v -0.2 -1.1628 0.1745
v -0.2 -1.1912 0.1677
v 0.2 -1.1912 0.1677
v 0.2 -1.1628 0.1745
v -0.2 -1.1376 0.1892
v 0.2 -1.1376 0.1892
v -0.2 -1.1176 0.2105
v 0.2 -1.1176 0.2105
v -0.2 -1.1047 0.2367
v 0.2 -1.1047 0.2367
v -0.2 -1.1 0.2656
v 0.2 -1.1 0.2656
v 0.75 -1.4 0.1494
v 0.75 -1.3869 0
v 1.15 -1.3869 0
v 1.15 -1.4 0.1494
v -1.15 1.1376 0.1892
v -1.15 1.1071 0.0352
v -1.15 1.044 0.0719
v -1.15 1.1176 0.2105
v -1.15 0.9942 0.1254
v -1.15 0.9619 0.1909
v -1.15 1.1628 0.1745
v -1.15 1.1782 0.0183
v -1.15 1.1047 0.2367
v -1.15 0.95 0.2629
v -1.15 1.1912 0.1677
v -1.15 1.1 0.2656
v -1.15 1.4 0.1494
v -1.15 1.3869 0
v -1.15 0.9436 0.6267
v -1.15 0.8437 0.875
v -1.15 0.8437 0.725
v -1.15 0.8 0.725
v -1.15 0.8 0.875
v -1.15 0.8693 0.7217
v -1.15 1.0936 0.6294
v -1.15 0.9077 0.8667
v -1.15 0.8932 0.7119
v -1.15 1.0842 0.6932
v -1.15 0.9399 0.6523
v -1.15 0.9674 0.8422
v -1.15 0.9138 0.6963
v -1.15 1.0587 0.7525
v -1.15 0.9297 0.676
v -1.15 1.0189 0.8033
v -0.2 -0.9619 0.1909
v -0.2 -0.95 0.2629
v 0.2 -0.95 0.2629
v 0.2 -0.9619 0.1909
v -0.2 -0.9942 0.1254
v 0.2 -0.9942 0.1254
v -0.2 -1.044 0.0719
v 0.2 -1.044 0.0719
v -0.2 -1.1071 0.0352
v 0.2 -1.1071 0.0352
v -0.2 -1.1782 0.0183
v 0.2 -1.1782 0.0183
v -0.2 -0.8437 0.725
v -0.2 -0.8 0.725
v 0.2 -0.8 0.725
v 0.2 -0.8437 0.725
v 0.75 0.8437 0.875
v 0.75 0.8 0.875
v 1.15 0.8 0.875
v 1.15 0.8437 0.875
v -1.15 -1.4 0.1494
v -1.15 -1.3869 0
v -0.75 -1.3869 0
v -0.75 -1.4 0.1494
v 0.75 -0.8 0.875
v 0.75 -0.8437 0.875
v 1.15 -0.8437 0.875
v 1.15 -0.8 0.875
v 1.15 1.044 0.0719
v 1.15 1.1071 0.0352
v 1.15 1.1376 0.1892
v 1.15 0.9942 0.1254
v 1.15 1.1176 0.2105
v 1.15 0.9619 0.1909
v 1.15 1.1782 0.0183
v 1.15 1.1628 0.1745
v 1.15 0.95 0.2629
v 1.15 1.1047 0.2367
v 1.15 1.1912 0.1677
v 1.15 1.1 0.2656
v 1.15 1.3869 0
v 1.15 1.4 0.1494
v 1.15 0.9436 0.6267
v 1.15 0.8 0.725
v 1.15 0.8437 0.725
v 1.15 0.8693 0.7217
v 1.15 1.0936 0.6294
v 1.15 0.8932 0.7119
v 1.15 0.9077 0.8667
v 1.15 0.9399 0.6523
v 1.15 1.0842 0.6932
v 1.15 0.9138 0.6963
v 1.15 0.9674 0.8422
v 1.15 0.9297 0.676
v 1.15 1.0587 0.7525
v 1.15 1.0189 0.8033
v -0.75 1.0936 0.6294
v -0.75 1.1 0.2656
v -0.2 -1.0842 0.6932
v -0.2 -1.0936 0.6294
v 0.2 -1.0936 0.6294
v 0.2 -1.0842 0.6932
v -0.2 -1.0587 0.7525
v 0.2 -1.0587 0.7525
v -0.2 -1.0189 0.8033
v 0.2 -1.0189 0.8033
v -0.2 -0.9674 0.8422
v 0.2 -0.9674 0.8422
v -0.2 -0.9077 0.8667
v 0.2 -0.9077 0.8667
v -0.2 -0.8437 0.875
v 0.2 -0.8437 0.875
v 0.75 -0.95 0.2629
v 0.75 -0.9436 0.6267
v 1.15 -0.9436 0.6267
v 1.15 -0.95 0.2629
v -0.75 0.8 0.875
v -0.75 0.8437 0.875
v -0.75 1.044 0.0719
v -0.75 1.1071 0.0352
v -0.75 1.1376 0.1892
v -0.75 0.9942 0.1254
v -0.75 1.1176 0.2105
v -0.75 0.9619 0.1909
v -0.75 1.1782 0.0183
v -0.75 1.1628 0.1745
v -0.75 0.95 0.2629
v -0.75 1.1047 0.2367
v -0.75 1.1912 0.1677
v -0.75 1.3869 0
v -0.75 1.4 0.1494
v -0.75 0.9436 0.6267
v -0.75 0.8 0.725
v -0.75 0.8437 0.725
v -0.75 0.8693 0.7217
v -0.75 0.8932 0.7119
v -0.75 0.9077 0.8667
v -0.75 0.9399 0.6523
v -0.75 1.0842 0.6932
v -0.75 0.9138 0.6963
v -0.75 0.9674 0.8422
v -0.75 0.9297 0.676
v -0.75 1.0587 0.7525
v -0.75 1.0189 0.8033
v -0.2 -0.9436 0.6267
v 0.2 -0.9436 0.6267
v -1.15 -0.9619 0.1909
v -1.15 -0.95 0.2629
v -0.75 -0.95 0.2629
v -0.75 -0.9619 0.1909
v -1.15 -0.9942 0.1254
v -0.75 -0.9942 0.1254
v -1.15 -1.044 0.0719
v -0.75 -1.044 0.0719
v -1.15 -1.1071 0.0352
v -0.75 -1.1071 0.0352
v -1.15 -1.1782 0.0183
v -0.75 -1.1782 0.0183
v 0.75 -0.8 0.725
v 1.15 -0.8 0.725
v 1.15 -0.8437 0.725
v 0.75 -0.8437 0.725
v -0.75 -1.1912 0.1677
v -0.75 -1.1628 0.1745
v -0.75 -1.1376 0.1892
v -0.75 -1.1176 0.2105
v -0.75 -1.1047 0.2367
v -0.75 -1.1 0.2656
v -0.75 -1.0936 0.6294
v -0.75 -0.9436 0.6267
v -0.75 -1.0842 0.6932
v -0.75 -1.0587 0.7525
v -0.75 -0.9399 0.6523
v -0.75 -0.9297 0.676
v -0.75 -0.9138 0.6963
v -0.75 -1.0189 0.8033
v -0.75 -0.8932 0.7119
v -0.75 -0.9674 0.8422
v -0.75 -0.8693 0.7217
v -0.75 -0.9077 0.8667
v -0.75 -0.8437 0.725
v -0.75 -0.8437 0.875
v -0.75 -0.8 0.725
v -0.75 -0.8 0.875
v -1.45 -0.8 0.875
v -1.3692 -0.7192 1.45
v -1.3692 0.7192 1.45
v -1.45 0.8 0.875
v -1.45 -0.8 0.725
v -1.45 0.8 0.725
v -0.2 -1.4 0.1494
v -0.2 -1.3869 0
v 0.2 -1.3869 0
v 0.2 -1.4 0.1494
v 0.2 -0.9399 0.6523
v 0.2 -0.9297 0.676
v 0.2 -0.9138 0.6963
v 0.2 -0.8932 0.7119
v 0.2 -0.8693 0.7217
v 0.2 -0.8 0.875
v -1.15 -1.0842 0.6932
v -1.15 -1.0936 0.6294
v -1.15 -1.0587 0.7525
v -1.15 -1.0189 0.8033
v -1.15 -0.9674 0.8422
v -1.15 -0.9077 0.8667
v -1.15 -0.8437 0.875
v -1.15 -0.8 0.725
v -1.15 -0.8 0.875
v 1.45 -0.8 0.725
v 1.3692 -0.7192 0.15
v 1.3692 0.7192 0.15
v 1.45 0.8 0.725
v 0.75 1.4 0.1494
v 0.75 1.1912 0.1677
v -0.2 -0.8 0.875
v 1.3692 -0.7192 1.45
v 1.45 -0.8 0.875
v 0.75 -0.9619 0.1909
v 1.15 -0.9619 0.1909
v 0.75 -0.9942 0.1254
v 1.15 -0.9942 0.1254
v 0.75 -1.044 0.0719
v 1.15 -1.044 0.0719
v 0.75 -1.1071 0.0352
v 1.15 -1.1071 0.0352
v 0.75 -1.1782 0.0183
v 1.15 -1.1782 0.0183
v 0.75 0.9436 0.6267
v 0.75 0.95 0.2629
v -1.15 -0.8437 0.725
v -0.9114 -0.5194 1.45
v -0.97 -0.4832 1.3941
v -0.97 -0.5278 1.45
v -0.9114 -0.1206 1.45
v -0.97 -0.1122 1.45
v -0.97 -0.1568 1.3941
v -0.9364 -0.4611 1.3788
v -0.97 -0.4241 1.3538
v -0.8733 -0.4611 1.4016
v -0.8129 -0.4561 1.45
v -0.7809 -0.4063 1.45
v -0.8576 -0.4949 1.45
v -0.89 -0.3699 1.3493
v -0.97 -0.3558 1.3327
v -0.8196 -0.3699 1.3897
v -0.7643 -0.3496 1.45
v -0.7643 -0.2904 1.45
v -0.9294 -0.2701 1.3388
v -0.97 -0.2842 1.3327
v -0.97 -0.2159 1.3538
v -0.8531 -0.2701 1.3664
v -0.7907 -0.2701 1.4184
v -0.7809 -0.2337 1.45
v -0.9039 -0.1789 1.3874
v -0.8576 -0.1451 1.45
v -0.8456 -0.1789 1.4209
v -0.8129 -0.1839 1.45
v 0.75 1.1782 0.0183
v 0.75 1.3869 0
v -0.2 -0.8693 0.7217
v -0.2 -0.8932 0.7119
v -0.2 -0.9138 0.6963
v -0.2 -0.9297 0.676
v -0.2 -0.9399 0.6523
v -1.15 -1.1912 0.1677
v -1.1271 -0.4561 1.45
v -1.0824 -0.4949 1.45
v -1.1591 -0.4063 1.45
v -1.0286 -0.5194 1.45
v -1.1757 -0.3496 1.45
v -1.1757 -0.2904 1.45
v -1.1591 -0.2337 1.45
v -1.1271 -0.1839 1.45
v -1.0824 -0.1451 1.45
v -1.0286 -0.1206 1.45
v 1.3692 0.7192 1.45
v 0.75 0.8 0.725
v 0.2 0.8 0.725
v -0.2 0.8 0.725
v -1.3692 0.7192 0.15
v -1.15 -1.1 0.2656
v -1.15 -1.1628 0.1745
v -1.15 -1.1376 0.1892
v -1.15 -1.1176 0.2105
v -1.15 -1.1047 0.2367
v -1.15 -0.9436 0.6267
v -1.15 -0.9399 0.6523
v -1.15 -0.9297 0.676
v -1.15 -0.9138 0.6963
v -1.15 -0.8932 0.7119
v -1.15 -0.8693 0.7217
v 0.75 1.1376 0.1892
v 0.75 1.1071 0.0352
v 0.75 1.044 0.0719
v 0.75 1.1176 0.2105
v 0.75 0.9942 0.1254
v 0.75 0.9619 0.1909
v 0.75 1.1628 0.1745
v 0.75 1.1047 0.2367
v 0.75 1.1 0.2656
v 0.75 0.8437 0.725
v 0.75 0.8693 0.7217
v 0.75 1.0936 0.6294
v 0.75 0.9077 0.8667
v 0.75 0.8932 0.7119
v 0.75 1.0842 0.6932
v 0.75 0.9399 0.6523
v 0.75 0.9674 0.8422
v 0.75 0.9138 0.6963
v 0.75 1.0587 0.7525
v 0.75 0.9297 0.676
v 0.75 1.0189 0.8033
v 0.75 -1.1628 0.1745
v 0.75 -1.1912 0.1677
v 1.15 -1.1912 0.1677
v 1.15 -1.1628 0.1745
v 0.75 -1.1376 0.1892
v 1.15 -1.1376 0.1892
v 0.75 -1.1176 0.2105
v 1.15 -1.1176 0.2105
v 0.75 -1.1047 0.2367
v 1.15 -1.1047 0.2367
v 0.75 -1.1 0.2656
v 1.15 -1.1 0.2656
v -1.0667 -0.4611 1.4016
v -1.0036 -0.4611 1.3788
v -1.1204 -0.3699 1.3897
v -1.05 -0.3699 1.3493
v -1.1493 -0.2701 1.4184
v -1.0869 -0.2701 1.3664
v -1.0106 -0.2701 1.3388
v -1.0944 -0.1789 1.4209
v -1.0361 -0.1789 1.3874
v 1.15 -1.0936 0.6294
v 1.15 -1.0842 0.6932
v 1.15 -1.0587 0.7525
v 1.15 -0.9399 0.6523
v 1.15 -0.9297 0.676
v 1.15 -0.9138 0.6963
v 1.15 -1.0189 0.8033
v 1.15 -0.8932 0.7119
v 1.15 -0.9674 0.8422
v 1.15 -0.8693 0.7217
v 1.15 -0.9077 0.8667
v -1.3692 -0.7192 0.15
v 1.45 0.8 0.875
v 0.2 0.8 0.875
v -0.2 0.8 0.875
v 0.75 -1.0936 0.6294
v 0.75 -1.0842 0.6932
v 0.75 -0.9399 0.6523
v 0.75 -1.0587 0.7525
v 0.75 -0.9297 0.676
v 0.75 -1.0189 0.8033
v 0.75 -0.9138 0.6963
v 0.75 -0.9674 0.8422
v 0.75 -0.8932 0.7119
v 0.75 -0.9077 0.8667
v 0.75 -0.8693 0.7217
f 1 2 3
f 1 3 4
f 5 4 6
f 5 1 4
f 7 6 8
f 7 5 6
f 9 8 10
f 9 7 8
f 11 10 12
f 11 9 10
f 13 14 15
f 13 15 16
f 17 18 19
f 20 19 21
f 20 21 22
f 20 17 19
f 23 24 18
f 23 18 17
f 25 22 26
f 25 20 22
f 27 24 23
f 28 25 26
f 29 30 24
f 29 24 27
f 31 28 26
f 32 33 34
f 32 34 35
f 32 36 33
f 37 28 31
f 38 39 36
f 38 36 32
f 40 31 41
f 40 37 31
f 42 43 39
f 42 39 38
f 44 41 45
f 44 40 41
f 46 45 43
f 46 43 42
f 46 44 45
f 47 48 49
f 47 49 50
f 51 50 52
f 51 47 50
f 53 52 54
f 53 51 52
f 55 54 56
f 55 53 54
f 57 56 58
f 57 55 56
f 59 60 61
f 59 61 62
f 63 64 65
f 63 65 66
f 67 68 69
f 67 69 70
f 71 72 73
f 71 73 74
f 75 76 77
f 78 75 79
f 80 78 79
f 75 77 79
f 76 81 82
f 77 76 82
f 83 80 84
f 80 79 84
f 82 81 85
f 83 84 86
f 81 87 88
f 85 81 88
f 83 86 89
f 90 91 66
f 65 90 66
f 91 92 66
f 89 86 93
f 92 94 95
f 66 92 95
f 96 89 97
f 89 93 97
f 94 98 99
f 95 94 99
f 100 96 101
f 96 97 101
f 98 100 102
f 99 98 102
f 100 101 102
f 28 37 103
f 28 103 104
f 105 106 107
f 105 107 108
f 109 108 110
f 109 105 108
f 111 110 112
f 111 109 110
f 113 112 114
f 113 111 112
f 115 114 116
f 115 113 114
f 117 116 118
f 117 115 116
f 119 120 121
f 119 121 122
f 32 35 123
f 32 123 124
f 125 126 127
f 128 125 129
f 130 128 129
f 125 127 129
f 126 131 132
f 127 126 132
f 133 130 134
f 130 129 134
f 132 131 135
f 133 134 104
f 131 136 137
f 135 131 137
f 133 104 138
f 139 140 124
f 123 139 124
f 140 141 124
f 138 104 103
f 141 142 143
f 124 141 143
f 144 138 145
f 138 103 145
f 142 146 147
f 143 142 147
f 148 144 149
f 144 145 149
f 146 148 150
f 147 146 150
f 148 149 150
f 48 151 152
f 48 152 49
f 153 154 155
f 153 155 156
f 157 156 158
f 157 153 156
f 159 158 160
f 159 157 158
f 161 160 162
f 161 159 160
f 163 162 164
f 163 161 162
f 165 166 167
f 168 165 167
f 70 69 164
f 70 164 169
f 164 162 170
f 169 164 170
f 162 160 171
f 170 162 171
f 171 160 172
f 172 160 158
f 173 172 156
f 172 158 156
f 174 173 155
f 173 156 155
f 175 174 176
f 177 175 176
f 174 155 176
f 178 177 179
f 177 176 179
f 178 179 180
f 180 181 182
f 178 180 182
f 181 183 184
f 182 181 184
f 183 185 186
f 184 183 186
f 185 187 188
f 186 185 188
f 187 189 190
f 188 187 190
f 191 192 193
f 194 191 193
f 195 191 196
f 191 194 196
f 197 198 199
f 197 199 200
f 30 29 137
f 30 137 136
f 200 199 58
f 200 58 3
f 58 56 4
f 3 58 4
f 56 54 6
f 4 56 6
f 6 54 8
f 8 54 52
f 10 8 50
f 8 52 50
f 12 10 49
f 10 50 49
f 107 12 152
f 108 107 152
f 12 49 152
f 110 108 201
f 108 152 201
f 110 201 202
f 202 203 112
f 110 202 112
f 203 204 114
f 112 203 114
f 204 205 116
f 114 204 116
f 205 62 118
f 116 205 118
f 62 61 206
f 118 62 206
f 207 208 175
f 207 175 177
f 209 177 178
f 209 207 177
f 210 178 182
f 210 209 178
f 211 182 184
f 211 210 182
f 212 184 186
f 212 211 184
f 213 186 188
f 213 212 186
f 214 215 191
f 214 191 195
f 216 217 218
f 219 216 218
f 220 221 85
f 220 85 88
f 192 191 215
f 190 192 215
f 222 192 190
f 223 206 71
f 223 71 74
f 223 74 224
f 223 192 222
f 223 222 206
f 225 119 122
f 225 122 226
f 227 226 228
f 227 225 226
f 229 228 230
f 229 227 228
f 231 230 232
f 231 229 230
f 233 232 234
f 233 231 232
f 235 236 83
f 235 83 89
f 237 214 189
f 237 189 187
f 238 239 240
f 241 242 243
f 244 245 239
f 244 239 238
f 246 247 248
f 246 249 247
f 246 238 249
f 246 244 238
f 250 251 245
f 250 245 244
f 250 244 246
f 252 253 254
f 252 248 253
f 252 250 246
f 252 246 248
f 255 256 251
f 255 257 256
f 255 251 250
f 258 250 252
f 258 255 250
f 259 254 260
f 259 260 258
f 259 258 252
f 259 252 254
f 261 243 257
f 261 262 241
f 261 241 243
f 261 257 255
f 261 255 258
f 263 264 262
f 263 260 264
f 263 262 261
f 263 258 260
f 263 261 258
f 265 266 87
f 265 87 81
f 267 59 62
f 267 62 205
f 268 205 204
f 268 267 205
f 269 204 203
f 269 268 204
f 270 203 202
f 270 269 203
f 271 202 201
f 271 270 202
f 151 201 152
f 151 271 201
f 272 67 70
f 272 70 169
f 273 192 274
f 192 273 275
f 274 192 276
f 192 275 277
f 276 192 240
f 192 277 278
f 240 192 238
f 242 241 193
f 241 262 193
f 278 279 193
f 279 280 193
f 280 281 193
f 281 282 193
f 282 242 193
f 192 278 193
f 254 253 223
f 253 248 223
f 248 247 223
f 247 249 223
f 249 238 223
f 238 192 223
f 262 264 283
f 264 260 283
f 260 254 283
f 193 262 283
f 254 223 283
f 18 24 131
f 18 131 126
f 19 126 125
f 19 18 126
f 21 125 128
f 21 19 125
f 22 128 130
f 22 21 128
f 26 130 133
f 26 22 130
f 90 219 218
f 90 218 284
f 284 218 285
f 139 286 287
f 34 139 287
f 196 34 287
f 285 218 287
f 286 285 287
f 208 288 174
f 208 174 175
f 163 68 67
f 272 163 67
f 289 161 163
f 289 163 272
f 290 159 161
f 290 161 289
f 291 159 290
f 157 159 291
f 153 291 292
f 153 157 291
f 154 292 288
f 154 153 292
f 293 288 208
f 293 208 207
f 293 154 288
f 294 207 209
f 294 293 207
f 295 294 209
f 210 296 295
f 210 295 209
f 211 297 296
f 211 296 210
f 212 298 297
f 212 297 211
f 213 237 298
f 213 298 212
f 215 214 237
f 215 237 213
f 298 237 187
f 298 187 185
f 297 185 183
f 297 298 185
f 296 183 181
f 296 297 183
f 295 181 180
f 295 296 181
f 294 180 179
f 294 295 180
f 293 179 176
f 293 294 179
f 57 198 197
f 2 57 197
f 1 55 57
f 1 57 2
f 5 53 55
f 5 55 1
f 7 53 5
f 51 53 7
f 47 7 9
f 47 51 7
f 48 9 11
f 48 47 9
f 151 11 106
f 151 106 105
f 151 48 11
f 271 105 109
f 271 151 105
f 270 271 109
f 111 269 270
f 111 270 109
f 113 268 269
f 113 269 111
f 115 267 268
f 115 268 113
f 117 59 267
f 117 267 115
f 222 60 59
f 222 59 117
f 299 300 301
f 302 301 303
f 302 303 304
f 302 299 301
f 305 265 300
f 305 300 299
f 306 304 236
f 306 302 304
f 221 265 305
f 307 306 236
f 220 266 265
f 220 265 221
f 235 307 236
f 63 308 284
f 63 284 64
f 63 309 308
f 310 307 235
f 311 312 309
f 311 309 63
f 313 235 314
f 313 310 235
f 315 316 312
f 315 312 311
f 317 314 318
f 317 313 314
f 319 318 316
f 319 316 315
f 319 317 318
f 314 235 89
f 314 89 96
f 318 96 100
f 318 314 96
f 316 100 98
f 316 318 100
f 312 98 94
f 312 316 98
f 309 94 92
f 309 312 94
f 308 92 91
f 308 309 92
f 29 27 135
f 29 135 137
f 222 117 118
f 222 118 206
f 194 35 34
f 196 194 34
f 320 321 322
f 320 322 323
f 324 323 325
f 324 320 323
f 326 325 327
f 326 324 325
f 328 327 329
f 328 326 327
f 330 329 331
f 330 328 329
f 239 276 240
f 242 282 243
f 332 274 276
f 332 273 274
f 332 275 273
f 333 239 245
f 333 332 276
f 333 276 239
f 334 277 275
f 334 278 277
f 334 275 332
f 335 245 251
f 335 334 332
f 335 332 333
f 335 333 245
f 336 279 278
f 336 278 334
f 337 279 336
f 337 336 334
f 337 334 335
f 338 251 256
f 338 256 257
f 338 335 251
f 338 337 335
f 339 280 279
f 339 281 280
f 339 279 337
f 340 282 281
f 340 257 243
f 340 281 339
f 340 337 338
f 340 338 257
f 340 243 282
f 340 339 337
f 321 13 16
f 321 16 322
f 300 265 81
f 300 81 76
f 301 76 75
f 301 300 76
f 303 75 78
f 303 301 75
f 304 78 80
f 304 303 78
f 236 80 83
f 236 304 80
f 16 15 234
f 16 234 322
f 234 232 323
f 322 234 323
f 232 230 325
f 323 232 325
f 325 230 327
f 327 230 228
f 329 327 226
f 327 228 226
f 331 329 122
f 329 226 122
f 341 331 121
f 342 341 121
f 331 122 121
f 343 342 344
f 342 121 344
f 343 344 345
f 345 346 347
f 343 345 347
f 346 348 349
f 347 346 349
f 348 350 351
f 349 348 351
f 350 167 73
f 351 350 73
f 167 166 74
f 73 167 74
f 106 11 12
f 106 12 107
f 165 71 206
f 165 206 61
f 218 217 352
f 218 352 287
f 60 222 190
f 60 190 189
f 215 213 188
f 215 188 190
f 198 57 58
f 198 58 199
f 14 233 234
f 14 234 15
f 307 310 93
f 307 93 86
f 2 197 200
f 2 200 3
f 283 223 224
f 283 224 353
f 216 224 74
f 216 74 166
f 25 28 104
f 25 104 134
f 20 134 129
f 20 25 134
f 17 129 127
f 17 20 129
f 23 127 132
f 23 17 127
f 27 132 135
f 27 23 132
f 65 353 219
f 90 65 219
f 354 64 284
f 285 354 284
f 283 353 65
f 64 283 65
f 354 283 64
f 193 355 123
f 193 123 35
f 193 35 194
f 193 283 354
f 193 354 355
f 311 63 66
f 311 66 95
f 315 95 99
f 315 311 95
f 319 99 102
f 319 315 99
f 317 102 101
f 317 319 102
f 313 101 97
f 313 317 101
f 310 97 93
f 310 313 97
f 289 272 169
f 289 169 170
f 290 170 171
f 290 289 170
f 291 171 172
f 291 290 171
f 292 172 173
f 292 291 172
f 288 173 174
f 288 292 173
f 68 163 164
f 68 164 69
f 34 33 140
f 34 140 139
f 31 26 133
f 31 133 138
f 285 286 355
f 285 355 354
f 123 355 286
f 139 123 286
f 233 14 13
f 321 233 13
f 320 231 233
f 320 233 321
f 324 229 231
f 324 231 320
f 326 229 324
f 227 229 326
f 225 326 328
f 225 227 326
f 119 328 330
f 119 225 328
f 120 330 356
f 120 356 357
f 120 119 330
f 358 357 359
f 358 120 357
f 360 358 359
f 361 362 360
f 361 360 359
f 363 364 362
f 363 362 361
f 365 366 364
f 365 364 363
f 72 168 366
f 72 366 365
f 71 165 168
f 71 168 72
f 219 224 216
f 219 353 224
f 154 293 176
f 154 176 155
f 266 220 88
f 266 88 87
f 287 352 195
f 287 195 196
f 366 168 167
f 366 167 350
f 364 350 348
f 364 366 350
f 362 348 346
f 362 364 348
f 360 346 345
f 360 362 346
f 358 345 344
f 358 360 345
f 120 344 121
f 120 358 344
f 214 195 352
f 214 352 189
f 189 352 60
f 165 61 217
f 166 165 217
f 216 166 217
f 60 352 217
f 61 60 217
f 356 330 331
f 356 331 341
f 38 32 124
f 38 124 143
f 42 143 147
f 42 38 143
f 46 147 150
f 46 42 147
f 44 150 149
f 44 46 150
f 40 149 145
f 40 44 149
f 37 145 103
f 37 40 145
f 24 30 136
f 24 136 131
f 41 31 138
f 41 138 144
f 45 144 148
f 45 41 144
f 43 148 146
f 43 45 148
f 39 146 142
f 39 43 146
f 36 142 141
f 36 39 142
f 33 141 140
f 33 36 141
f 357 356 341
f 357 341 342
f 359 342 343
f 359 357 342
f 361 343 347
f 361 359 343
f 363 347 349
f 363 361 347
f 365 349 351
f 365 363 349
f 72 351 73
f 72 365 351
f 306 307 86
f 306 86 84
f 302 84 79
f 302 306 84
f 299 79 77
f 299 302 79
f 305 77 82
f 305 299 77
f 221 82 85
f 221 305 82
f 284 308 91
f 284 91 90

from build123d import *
from OCP.BRepFilletAPI import BRepFilletAPI_MakeChamfer
from build123d.topology import SkipClean

# Parameters (mm, degrees)
BODYWXH_W             = 1.3
BODYWXH_H             = 1.6
BOSS_BODY_DEPTH       = 1.45
CHAMFER1_SIZE         = 0.575
CHAMFER1_SIZE2        = 0.08081098
PINS_DEPTH            = 0.4
PATTERNLEADS_COUNT    = 3
PATTERNLEADS_PITCH    = 0.95
DELETEFACE1_START     = 0.8
DELETEFACE1_OUTLINE_W = 0.4
DELETEFACE1_OUTLINE_H = 1.875
DELETEFACE1_DEPTH     = 0.6


# Read off the part's stored shape, not the designer's step: DeleteFace1
with BuildPart() as part:
    # BodyWxH → Boss-Body (new, symmetric)
    with BuildSketch(Plane(origin=(0, 0, 0), x_dir=(0, 0, -1), z_dir=(1, 0, 0))):
        with Locations((-0.8, 0)):
            Rectangle(BODYWXH_W, BODYWXH_H)
    extrude(amount=BOSS_BODY_DEPTH, both=True)

    # Chamfer1: one chamfer whose edges measure the first distance from different faces: ONE call of the kernel's chamfer builder (chamfer() names one face for all edges)
    chamfer1_edges_1 = [part.edges().sort_by_distance(p)[0] for p in [
        (1.45, 0, 0.15),
        (1.45, 0, 1.45),
    ]]
    chamfer1_side_1 = [part.faces().sort_by_distance(p)[0] for p in [
        (1.45, 0, 0.8),
    ]]
    chamfer1_edges_2 = [part.edges().sort_by_distance(p)[0] for p in [
        (-1.45, 0, 0.15),
        (-1.45, 0, 1.45),
    ]]
    chamfer1_side_2 = [part.faces().sort_by_distance(p)[0] for p in [
        (-1.45, 0, 0.8),
    ]]
    chamfer1_edges_3 = [part.edges().sort_by_distance(p)[0] for p in [
        (0, 0.8, 1.45),
        (0, 0.8, 0.15),
    ]]
    chamfer1_side_3 = [part.faces().sort_by_distance(p)[0] for p in [
        (0, 0.8, 0.8),
    ]]
    chamfer1_edges_4 = [part.edges().sort_by_distance(p)[0] for p in [
        (0, -0.8, 0.15),
        (0, -0.8, 1.45),
    ]]
    chamfer1_side_4 = [part.faces().sort_by_distance(p)[0] for p in [
        (0, -0.8, 0.8),
    ]]
    chamfer1 = BRepFilletAPI_MakeChamfer(part.part.solid().wrapped)
    for e in chamfer1_edges_1:
        chamfer1.Add(CHAMFER1_SIZE, CHAMFER1_SIZE2, e.wrapped, chamfer1_side_1[0].wrapped)  # the first distance lies on this face
    for e in chamfer1_edges_2:
        chamfer1.Add(CHAMFER1_SIZE, CHAMFER1_SIZE2, e.wrapped, chamfer1_side_2[0].wrapped)  # the first distance lies on this face
    for e in chamfer1_edges_3:
        chamfer1.Add(CHAMFER1_SIZE, CHAMFER1_SIZE2, e.wrapped, chamfer1_side_3[0].wrapped)  # the first distance lies on this face
    for e in chamfer1_edges_4:
        chamfer1.Add(CHAMFER1_SIZE, CHAMFER1_SIZE2, e.wrapped, chamfer1_side_4[0].wrapped)  # the first distance lies on this face
    add(Compound.cast(chamfer1.Shape()), mode=Mode.REPLACE)

    # LeadCross → Pins (add)
    with BuildSketch(Plane(origin=(-1.15, 0, 0), x_dir=(0, 0, -1), z_dir=(1, 0, 0))):
        with BuildLine():
            Line((0, -1.386926639), (-0.149429205, -1.4))
            Line((-0.149429205, -1.4), (-0.167692783, -1.19124635))
            ThreePointArc((-0.167692783, -1.19124635), (-0.199112416, -1.126826554), (-0.265567012, -1.099977154))
            Line((-0.265567012, -1.099977154), (-0.629363102, -1.09362707))
            ThreePointArc((-0.629363102, -1.09362707), (-0.803312612, -1.018892462), (-0.875, -0.843665146))
            Line((-0.875, -0.843665146), (-0.875, 0.843665146))
            ThreePointArc((-0.875, 0.843665146), (-0.803312612, 1.018892462), (-0.629363102, 1.09362707))
            Line((-0.629363102, 1.09362707), (-0.265567012, 1.099977154))
            ThreePointArc((-0.265567012, 1.099977154), (-0.199112416, 1.126826554), (-0.167692783, 1.19124635))
            Line((-0.167692783, 1.19124635), (-0.149429205, 1.4))
            Line((-0.149429205, 1.4), (0, 1.386926639))
            Line((0, 1.386926639), (-0.018263578, 1.178172988))
            ThreePointArc((-0.018263578, 1.178172988), (-0.096812662, 1.017123498), (-0.262949151, 0.95))
            Line((-0.262949151, 0.95), (-0.626745241, 0.943649916))
            ThreePointArc((-0.626745241, 0.943649916), (-0.696325045, 0.913756073), (-0.725, 0.843665146))
            Line((-0.725, 0.843665146), (-0.725, -0.843665146))
            ThreePointArc((-0.725, -0.843665146), (-0.696325045, -0.913756073), (-0.626745241, -0.943649916))
            Line((-0.626745241, -0.943649916), (-0.262949151, -0.95))
            ThreePointArc((-0.262949151, -0.95), (-0.096812662, -1.017123498), (-0.018263578, -1.178172988))
            Line((-0.018263578, -1.178172988), (0, -1.386926639))
        make_face()
    pins = extrude(amount=PINS_DEPTH)

    # PatternLeads: Pins ×3
    with Locations(*[(i * PATTERNLEADS_PITCH, 0, 0) for i in range(1, PATTERNLEADS_COUNT)]):
        add(pins)

    # Pin1Indent → Cut-Pin1Indent (revolve, cut)
    with SkipClean():  # the faces are left unmerged after this step: merging them gives an invalid solid
        with BuildSketch(Plane(origin=(-0.97, 0, 0), x_dir=(0, 0, -1), z_dir=(1, 0, 0))):
            with BuildLine():
                Line((-1.57, -0.08), (-1.57, -0.56))
                ThreePointArc((-1.57, -0.56), (-1.33, -0.32), (-1.57, -0.08))
            make_face()
        revolve(axis=Axis((-0.97, -0.08, 1.57), (0, -1, 0)), mode=Mode.SUBTRACT)

    # DeleteFace1 outline → DeleteFace1 (cut)
    with SkipClean():  # the faces are left unmerged after this step: merging them gives an invalid solid
        with BuildSketch(Plane(origin=(0, 0, 0), x_dir=(1, 0, 0), z_dir=(0, 1, 0)).offset(DELETEFACE1_START)):
            with Locations((0, 0.0625)):
                Rectangle(DELETEFACE1_OUTLINE_W, DELETEFACE1_OUTLINE_H)
        extrude(amount=DELETEFACE1_DEPTH, mode=Mode.SUBTRACT)


solid = part.part
